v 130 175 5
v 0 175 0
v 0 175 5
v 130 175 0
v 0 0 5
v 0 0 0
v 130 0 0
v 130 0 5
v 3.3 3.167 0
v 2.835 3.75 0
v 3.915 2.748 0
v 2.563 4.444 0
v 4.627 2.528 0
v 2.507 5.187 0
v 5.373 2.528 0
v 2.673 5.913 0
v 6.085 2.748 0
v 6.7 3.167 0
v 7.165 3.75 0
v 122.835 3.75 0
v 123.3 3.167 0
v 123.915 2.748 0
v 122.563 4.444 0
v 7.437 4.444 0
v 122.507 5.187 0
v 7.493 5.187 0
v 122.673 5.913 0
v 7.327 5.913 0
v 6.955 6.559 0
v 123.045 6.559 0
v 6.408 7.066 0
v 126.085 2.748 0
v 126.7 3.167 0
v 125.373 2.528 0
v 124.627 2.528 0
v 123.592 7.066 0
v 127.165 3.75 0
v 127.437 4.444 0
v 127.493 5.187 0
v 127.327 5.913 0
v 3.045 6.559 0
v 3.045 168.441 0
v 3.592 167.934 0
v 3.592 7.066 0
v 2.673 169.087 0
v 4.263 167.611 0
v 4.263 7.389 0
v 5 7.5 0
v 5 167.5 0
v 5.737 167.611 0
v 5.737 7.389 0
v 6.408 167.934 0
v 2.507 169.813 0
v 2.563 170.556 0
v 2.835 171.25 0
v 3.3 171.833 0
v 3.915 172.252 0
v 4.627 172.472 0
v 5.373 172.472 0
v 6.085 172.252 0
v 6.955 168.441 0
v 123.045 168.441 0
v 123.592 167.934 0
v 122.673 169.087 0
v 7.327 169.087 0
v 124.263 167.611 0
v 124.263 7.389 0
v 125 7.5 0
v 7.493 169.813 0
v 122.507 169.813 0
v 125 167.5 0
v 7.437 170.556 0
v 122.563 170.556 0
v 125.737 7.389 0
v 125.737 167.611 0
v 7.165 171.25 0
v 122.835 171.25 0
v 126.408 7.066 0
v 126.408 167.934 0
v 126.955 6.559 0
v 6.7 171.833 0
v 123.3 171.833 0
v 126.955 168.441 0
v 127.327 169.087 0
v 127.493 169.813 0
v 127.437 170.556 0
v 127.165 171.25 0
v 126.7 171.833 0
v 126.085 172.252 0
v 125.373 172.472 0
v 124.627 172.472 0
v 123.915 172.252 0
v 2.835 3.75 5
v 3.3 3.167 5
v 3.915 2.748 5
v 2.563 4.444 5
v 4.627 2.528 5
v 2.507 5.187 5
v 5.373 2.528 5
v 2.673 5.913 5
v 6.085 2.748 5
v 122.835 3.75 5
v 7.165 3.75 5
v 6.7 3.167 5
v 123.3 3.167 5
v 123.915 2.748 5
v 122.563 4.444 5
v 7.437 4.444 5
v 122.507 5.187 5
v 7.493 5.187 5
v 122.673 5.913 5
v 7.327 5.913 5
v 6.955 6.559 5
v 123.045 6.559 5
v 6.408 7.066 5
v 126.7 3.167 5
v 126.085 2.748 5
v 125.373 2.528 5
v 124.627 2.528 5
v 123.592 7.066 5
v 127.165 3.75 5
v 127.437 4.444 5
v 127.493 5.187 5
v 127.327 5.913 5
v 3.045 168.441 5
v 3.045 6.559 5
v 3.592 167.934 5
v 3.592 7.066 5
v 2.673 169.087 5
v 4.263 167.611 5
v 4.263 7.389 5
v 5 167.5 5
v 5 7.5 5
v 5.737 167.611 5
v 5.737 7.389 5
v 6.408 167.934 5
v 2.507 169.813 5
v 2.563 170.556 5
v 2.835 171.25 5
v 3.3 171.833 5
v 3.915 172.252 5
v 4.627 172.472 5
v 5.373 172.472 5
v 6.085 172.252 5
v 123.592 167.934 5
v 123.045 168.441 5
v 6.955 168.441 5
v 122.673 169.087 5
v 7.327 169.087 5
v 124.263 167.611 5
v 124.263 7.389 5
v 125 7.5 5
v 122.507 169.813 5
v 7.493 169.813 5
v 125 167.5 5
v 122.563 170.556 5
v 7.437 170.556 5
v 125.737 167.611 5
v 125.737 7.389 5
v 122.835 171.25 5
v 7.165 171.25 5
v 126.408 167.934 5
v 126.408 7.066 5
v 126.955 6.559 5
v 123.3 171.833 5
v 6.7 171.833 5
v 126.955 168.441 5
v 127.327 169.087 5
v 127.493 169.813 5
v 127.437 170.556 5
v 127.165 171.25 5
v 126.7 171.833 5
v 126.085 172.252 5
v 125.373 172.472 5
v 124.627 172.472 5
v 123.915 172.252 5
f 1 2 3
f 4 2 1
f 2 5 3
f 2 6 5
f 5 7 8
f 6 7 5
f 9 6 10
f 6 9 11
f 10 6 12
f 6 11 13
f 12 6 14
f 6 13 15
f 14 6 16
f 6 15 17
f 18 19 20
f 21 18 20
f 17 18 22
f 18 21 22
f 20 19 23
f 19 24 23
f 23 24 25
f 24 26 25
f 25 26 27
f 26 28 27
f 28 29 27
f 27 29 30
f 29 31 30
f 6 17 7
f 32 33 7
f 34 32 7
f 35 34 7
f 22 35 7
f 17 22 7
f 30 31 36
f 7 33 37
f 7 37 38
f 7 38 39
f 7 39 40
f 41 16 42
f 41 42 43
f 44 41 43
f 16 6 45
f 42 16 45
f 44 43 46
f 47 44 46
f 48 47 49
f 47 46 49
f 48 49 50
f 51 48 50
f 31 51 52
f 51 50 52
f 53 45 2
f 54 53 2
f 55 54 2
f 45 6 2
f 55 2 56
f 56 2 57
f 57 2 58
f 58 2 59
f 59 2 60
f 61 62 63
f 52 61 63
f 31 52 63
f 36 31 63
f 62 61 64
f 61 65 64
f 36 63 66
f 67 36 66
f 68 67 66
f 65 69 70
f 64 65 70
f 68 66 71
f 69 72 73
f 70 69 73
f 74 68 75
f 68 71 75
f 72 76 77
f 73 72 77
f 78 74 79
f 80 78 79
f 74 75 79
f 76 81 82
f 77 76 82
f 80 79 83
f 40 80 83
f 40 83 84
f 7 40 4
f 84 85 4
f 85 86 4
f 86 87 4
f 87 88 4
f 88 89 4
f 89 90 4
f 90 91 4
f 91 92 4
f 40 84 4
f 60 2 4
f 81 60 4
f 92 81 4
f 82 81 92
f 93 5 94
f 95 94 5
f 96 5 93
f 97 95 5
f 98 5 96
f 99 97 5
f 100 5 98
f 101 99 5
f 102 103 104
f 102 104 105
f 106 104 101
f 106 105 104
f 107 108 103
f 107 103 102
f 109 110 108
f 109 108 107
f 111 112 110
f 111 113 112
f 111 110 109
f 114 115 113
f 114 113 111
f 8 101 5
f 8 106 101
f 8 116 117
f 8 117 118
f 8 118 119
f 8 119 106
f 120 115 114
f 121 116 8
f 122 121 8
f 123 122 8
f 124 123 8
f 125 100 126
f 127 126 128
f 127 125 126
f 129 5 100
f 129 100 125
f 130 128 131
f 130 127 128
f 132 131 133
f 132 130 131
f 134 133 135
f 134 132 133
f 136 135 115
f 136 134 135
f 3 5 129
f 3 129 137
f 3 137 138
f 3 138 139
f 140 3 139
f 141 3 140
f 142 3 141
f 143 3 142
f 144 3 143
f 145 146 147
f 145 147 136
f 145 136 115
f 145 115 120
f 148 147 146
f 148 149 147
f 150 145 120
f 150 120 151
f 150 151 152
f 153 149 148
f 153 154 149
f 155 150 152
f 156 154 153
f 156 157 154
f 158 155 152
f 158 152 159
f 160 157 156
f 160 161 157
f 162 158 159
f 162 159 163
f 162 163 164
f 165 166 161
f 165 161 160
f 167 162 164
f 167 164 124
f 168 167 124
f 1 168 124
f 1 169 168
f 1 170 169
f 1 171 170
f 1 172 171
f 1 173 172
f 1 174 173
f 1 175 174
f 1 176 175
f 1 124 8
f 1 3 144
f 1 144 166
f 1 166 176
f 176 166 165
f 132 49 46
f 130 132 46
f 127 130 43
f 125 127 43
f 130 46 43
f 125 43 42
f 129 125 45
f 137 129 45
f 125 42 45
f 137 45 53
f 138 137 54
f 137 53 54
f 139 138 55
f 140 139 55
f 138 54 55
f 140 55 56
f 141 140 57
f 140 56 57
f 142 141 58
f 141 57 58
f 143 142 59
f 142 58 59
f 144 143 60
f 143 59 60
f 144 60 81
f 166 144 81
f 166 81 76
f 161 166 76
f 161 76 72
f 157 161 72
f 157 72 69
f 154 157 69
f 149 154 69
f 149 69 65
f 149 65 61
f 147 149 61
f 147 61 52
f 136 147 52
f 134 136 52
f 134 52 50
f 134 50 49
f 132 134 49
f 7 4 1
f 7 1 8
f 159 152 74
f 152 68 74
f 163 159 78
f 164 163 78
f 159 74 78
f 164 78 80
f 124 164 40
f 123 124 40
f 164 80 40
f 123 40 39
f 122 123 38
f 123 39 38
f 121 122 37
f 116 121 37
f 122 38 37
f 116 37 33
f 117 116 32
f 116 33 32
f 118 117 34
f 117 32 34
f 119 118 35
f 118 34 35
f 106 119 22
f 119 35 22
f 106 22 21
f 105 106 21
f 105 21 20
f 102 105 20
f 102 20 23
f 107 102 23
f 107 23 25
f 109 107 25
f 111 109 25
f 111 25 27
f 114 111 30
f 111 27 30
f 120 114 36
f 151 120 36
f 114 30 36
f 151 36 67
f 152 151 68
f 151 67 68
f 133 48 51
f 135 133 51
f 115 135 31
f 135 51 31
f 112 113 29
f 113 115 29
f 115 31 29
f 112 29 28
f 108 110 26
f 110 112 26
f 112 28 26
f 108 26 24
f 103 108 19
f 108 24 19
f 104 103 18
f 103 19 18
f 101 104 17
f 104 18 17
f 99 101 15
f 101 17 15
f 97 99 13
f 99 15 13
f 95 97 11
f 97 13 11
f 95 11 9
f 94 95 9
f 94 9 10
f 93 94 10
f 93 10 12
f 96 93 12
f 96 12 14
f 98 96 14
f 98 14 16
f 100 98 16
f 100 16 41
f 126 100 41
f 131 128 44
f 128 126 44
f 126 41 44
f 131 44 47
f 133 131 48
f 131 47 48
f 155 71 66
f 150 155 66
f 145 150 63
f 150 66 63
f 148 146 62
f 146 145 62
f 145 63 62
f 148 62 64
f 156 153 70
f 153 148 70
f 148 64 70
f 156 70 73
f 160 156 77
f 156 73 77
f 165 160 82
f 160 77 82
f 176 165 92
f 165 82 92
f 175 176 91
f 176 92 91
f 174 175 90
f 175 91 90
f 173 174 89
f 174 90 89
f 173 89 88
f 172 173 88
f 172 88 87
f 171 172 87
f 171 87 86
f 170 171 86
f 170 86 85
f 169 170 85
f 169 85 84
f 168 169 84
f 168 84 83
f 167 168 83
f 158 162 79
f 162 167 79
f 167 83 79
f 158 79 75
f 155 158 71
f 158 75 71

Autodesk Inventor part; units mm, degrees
ref_plane "XY Plane" through (0, 0, 0) normal (0, 0, 1) x (1, 0, 0)
sketch "Sketch2" plane through (0, 0, 0) normal (0, 0, 1) x (1, 0, 0)
  line L0 (0, 175) -> (130, 175)
  line L1 (130, 175) -> (130, 0)
  line L2 (130, 0) -> (0, 0)
  line L3 (0, 0) -> (0, 175)
  dimension "d2" = 175
  dimension "d3" = 130
extrude "Extrusion1" add sketch "Sketch2" along normal blind 5
sketch "Sketch3" plane through (0, 0, 5) normal (0, 0, 1) x (1, 0, 0)
  line L0 (130, 175) -> (0, 175) projected
  line L1 (0, 0) -> (130, 0) projected
  line L2 (0, 175) -> (0, 0) projected
  line L3 (130, 0) -> (130, 175) projected
  point P0 (5, 170)
  dimension "d8" = 5
  dimension "d9" = 5
hole "Hole1" at (5, 170, 5) direction (0, 0, -1) diameter 5 depth 5
ref_plane "Work Plane1" through (65, 0, 0) normal (1, 0, 0) x (0, 1, 0)
mirror "Mirror1" about plane through (65, 0, 0) normal (1, 0, 0) of "Hole1"
ref_plane "Work Plane2" through (0, 87.5, 0) normal (0, 1, 0) x (-1, 0, 0)
mirror "Mirror2" about plane through (0, 87.5, 0) normal (0, 1, 0) of "Hole1", "Mirror1"
properties part number "basePlate"
